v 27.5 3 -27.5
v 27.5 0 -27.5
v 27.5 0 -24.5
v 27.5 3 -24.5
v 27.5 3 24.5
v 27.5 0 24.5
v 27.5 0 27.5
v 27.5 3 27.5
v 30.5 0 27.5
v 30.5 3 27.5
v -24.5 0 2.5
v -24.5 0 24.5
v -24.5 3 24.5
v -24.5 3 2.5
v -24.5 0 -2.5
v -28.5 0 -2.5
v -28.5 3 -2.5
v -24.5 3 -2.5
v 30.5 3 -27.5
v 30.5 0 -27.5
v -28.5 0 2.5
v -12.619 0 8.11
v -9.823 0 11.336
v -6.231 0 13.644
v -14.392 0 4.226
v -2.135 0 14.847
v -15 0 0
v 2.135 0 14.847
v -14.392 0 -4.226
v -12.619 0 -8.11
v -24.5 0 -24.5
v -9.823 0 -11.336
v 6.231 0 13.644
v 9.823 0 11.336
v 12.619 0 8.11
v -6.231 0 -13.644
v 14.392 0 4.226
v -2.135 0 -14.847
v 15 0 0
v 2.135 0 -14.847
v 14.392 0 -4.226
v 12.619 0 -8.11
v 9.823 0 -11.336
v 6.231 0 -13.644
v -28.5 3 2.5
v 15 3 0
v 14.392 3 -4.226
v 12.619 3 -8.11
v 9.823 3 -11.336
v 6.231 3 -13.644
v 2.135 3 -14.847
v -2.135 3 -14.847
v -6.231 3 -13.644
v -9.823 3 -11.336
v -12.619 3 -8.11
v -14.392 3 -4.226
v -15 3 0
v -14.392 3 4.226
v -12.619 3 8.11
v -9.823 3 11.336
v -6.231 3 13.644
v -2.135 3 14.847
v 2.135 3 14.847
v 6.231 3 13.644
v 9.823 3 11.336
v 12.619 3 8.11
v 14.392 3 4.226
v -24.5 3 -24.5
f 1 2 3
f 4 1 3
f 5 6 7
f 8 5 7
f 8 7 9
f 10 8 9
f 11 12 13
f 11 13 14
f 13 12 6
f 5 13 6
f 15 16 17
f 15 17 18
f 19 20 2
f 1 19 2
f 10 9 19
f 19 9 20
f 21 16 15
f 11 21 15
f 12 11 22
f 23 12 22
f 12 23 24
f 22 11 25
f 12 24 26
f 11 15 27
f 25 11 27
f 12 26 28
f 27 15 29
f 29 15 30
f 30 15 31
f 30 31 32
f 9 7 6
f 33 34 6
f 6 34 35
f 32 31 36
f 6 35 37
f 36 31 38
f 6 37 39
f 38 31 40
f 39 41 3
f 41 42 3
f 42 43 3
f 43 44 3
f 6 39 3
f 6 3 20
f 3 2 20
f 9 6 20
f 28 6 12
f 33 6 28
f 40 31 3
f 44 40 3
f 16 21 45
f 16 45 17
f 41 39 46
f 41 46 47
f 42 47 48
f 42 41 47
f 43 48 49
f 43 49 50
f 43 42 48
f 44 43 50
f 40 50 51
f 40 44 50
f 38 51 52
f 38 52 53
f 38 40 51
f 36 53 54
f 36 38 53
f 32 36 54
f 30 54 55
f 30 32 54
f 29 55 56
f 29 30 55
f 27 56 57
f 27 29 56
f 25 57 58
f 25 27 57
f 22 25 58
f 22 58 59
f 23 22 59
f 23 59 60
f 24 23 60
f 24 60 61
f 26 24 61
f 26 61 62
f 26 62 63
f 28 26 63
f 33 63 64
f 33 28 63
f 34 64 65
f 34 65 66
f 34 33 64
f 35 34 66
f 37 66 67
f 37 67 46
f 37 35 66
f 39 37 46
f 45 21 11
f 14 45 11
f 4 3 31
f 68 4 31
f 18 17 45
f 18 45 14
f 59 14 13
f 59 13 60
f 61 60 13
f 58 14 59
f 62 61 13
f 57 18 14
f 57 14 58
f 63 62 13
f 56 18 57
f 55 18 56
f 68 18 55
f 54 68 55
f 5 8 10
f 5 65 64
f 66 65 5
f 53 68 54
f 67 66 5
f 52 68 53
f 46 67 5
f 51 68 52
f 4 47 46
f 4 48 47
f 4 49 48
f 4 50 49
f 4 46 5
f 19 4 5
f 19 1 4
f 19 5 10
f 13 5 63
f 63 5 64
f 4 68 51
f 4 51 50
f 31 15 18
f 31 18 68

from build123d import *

# Parameters (mm, degrees)
SKETCH1_W           = 49
SKETCH1_H           = 49
SKETCH1_R           = 15
SKETCH1_W_2         = 4
SKETCH1_H_2         = 5
SKETCH1_W_3         = 3
BOSS_EXTRUDE1_DEPTH = 3


with BuildPart() as part:
    # Sketch1 → Boss-Extrude1 (new body)
    with BuildSketch(Plane(origin=(0, 0, 0), x_dir=(1, 0, 0), z_dir=(0, 1, 0))):
        Rectangle(SKETCH1_W, SKETCH1_H)
        Circle(SKETCH1_R, mode=Mode.SUBTRACT)
        with Locations((-26.5, 0)):
            Rectangle(SKETCH1_W_2, SKETCH1_H_2)
        with Locations((26, 0)):
            Rectangle(SKETCH1_W_3, SKETCH1_H)
        Polygon((30.5, 27.5), (27.5, 27.5), (27.5, 24.5), (27.5, -24.5), (27.5, -27.5), (30.5, -27.5), align=None)
    extrude(amount=BOSS_EXTRUDE1_DEPTH)


solid = part.part
